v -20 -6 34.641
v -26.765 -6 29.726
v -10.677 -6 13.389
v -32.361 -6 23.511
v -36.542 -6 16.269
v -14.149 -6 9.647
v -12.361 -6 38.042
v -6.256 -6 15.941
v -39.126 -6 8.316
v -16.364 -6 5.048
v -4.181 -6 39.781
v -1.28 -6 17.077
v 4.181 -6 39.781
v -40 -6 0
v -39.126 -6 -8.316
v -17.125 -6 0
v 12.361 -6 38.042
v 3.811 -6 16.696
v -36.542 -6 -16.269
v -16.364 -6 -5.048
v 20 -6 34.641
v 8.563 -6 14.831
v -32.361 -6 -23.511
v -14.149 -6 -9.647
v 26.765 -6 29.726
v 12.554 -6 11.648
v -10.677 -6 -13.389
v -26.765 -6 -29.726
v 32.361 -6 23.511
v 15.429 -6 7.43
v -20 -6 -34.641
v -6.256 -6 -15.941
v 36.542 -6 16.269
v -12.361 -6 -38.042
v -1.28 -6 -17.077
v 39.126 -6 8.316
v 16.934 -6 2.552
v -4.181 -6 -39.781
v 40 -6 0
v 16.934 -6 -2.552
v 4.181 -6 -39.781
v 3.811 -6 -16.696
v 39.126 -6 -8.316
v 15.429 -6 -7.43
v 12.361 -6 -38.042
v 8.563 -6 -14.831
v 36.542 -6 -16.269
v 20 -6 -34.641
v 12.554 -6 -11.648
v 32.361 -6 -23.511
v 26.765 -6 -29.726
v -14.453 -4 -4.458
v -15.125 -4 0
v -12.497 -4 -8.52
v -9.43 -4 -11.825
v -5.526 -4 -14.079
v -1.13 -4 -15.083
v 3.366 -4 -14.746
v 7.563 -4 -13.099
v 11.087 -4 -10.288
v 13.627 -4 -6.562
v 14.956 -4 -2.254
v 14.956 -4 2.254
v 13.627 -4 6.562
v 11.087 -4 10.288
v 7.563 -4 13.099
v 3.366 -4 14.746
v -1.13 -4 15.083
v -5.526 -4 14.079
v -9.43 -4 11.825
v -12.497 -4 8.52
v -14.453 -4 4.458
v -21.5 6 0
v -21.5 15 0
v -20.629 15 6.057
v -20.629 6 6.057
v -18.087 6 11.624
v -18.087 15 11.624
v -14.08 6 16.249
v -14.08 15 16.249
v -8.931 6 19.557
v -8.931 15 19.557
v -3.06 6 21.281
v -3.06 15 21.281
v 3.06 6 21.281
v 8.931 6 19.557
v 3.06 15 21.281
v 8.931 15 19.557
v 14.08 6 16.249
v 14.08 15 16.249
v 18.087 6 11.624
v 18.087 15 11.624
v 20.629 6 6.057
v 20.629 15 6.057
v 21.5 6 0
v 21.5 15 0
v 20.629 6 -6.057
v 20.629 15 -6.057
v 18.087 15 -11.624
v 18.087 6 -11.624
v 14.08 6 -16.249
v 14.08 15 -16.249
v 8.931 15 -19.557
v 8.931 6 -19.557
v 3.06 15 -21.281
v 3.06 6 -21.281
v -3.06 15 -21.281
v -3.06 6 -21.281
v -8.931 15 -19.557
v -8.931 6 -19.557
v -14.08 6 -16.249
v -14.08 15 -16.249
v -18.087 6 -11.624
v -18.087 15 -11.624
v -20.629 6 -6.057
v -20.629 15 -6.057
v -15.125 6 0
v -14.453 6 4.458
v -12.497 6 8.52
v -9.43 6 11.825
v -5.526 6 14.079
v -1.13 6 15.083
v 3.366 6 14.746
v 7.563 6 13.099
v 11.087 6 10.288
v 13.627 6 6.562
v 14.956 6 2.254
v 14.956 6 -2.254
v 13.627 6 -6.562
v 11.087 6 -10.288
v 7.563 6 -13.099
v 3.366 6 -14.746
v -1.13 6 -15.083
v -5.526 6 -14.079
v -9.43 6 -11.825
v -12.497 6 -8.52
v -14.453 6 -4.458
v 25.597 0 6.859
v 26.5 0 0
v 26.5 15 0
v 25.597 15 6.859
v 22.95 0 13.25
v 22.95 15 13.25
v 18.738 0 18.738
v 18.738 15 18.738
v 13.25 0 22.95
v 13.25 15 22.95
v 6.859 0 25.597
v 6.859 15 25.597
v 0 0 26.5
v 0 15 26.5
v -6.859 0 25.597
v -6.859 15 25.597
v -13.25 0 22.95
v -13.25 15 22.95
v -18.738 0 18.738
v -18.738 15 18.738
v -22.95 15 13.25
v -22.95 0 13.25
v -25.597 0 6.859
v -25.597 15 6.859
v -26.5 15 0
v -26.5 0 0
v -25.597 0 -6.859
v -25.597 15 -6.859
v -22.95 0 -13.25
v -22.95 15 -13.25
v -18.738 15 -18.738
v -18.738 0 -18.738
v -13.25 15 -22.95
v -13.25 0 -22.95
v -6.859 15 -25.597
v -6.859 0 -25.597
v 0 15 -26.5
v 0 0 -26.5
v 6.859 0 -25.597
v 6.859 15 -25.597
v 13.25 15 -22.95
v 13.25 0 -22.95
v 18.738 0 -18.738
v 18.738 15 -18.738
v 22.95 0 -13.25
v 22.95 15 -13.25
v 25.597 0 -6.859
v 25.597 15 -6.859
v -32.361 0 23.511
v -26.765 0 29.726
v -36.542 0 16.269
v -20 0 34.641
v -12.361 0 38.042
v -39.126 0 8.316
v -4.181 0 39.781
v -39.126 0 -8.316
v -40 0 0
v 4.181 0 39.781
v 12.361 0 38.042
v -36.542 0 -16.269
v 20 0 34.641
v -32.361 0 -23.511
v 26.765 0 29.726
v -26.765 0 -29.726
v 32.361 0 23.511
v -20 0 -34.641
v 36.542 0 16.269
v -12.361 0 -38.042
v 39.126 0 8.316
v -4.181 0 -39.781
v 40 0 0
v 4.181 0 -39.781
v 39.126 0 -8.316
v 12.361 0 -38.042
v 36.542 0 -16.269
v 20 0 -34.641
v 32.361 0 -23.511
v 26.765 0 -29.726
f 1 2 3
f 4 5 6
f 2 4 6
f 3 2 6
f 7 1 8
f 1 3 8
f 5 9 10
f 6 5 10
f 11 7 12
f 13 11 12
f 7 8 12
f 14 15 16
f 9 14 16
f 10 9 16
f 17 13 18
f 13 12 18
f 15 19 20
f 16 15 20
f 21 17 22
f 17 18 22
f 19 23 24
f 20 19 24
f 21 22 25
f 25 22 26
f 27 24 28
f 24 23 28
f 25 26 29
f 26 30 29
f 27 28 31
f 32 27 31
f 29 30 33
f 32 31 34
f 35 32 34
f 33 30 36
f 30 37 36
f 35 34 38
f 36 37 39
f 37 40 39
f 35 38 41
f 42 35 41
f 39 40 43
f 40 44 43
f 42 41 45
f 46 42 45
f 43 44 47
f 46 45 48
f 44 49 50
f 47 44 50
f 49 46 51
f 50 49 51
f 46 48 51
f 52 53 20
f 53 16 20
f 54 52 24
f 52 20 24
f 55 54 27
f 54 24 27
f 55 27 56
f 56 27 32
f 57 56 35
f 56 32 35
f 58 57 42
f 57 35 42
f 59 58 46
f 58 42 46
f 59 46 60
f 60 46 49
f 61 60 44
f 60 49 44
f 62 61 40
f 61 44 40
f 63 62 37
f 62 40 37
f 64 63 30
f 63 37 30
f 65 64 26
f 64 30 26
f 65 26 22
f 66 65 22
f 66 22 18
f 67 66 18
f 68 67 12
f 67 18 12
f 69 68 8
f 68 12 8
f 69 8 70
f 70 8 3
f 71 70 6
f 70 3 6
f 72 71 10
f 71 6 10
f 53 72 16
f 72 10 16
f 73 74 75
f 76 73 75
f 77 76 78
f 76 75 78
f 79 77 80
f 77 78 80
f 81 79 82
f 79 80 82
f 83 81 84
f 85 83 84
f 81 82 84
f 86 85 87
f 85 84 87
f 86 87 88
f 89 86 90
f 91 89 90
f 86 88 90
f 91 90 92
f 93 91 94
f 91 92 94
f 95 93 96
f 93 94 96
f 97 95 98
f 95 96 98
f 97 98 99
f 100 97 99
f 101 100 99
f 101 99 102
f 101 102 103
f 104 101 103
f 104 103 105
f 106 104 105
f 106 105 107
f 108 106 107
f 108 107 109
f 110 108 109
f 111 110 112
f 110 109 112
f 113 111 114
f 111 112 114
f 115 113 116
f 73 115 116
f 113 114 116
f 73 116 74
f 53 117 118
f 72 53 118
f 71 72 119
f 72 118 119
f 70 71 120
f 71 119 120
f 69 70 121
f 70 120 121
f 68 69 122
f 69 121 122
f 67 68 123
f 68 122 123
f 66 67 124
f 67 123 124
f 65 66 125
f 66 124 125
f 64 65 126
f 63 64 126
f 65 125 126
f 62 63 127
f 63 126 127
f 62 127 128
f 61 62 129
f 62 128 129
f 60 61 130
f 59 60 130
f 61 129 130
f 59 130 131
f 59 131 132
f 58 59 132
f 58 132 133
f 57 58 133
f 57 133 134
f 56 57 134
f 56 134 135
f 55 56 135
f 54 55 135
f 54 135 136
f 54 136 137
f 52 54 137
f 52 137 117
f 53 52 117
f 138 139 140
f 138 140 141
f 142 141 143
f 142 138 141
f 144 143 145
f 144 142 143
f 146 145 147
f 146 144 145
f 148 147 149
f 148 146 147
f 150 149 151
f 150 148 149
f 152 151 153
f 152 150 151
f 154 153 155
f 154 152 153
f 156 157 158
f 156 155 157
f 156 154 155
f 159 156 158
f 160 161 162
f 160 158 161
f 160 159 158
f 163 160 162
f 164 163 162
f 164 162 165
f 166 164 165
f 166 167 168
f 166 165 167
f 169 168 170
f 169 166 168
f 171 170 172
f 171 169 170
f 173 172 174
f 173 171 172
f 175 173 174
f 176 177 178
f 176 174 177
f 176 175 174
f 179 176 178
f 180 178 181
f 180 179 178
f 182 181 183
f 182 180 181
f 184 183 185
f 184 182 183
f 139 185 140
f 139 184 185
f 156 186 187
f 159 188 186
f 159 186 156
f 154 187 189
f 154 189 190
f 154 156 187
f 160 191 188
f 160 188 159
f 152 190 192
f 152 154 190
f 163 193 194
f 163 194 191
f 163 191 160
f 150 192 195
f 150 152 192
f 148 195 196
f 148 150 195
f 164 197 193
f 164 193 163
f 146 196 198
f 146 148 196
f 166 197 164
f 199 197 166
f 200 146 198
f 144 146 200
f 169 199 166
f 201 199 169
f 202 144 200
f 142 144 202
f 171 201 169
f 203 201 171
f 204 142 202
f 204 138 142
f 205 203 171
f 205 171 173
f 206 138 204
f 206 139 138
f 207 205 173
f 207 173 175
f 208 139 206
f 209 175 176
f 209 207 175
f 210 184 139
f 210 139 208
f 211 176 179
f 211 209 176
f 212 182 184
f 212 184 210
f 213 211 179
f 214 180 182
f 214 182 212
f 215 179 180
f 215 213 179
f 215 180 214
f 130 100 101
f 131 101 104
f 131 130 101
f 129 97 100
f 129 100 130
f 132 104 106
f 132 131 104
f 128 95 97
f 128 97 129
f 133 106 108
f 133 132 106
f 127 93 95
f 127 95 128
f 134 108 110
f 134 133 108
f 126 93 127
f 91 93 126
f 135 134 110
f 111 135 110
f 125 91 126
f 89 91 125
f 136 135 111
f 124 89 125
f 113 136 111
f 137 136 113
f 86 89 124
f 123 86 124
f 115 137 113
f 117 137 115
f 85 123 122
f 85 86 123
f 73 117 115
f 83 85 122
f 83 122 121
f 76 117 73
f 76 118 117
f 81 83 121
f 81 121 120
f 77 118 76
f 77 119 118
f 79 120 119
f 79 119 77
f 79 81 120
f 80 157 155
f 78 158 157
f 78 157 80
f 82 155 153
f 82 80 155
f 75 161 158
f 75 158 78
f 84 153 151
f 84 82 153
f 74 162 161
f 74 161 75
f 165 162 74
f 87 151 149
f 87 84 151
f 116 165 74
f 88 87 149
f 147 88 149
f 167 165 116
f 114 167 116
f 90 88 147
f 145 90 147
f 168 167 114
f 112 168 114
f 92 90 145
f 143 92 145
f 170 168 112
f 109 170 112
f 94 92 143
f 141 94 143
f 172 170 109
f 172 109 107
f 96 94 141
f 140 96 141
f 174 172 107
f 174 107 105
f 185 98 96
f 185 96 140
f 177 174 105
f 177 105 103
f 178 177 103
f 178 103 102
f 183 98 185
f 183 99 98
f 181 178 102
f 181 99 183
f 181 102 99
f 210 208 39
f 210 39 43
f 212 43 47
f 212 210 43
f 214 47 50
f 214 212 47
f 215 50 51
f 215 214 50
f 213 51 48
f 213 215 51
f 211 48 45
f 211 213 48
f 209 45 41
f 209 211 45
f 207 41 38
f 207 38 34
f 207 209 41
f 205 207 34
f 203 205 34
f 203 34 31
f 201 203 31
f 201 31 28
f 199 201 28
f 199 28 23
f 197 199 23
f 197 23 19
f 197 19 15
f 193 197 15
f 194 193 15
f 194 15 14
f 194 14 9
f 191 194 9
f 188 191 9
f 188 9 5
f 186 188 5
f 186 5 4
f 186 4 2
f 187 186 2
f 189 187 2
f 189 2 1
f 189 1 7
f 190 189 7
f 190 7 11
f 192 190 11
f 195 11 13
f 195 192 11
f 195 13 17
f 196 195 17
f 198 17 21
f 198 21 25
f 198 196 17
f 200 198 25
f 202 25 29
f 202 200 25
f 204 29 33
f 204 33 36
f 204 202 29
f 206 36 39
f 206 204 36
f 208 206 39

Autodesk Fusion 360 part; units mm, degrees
sketch "Sketch1" plane through (0, 0, 0) normal (0, 1, 0) x (1, 0, 0)
  circle A0 centre (0, 0) radius 26.5
  circle A1 centre (0, 0) radius 40
  dimension "d1" = 53
  dimension "d2" = 80
extrude "Extrude1" add sketch "Sketch1" along normal blind 15 contours A0
extrude "Extrude2" add sketch "Sketch1" against normal blind 6 contours A0 | A1
sketch "Sketch2" plane through (0, 15, 0) normal (0, 1, 0) x (-1, 0, 0)
  circle A0 centre (0, 0) radius 26.5
  circle A1 centre (0, 0) radius 15.125
  dimension "d7" = 30.25
extrude "Extrude3" cut sketch "Sketch2" against normal blind 77.834 contours A1
sketch "Sketch3" plane through (0, 15, 0) normal (0, 1, 0) x (-1, 0, 0)
  circle A0 centre (0, 0) radius 15.125
  circle A1 centre (0, 0) radius 26.5
  circle A2 centre (0, 0) radius 21.5
  dimension "d10" = 43
extrude "Extrude4" cut sketch "Sketch3" against normal blind 9 contours A2
chamfer "Chamfer1" distance 2 angle 45 1 edges at (14.1015, -6, -5.4694)
